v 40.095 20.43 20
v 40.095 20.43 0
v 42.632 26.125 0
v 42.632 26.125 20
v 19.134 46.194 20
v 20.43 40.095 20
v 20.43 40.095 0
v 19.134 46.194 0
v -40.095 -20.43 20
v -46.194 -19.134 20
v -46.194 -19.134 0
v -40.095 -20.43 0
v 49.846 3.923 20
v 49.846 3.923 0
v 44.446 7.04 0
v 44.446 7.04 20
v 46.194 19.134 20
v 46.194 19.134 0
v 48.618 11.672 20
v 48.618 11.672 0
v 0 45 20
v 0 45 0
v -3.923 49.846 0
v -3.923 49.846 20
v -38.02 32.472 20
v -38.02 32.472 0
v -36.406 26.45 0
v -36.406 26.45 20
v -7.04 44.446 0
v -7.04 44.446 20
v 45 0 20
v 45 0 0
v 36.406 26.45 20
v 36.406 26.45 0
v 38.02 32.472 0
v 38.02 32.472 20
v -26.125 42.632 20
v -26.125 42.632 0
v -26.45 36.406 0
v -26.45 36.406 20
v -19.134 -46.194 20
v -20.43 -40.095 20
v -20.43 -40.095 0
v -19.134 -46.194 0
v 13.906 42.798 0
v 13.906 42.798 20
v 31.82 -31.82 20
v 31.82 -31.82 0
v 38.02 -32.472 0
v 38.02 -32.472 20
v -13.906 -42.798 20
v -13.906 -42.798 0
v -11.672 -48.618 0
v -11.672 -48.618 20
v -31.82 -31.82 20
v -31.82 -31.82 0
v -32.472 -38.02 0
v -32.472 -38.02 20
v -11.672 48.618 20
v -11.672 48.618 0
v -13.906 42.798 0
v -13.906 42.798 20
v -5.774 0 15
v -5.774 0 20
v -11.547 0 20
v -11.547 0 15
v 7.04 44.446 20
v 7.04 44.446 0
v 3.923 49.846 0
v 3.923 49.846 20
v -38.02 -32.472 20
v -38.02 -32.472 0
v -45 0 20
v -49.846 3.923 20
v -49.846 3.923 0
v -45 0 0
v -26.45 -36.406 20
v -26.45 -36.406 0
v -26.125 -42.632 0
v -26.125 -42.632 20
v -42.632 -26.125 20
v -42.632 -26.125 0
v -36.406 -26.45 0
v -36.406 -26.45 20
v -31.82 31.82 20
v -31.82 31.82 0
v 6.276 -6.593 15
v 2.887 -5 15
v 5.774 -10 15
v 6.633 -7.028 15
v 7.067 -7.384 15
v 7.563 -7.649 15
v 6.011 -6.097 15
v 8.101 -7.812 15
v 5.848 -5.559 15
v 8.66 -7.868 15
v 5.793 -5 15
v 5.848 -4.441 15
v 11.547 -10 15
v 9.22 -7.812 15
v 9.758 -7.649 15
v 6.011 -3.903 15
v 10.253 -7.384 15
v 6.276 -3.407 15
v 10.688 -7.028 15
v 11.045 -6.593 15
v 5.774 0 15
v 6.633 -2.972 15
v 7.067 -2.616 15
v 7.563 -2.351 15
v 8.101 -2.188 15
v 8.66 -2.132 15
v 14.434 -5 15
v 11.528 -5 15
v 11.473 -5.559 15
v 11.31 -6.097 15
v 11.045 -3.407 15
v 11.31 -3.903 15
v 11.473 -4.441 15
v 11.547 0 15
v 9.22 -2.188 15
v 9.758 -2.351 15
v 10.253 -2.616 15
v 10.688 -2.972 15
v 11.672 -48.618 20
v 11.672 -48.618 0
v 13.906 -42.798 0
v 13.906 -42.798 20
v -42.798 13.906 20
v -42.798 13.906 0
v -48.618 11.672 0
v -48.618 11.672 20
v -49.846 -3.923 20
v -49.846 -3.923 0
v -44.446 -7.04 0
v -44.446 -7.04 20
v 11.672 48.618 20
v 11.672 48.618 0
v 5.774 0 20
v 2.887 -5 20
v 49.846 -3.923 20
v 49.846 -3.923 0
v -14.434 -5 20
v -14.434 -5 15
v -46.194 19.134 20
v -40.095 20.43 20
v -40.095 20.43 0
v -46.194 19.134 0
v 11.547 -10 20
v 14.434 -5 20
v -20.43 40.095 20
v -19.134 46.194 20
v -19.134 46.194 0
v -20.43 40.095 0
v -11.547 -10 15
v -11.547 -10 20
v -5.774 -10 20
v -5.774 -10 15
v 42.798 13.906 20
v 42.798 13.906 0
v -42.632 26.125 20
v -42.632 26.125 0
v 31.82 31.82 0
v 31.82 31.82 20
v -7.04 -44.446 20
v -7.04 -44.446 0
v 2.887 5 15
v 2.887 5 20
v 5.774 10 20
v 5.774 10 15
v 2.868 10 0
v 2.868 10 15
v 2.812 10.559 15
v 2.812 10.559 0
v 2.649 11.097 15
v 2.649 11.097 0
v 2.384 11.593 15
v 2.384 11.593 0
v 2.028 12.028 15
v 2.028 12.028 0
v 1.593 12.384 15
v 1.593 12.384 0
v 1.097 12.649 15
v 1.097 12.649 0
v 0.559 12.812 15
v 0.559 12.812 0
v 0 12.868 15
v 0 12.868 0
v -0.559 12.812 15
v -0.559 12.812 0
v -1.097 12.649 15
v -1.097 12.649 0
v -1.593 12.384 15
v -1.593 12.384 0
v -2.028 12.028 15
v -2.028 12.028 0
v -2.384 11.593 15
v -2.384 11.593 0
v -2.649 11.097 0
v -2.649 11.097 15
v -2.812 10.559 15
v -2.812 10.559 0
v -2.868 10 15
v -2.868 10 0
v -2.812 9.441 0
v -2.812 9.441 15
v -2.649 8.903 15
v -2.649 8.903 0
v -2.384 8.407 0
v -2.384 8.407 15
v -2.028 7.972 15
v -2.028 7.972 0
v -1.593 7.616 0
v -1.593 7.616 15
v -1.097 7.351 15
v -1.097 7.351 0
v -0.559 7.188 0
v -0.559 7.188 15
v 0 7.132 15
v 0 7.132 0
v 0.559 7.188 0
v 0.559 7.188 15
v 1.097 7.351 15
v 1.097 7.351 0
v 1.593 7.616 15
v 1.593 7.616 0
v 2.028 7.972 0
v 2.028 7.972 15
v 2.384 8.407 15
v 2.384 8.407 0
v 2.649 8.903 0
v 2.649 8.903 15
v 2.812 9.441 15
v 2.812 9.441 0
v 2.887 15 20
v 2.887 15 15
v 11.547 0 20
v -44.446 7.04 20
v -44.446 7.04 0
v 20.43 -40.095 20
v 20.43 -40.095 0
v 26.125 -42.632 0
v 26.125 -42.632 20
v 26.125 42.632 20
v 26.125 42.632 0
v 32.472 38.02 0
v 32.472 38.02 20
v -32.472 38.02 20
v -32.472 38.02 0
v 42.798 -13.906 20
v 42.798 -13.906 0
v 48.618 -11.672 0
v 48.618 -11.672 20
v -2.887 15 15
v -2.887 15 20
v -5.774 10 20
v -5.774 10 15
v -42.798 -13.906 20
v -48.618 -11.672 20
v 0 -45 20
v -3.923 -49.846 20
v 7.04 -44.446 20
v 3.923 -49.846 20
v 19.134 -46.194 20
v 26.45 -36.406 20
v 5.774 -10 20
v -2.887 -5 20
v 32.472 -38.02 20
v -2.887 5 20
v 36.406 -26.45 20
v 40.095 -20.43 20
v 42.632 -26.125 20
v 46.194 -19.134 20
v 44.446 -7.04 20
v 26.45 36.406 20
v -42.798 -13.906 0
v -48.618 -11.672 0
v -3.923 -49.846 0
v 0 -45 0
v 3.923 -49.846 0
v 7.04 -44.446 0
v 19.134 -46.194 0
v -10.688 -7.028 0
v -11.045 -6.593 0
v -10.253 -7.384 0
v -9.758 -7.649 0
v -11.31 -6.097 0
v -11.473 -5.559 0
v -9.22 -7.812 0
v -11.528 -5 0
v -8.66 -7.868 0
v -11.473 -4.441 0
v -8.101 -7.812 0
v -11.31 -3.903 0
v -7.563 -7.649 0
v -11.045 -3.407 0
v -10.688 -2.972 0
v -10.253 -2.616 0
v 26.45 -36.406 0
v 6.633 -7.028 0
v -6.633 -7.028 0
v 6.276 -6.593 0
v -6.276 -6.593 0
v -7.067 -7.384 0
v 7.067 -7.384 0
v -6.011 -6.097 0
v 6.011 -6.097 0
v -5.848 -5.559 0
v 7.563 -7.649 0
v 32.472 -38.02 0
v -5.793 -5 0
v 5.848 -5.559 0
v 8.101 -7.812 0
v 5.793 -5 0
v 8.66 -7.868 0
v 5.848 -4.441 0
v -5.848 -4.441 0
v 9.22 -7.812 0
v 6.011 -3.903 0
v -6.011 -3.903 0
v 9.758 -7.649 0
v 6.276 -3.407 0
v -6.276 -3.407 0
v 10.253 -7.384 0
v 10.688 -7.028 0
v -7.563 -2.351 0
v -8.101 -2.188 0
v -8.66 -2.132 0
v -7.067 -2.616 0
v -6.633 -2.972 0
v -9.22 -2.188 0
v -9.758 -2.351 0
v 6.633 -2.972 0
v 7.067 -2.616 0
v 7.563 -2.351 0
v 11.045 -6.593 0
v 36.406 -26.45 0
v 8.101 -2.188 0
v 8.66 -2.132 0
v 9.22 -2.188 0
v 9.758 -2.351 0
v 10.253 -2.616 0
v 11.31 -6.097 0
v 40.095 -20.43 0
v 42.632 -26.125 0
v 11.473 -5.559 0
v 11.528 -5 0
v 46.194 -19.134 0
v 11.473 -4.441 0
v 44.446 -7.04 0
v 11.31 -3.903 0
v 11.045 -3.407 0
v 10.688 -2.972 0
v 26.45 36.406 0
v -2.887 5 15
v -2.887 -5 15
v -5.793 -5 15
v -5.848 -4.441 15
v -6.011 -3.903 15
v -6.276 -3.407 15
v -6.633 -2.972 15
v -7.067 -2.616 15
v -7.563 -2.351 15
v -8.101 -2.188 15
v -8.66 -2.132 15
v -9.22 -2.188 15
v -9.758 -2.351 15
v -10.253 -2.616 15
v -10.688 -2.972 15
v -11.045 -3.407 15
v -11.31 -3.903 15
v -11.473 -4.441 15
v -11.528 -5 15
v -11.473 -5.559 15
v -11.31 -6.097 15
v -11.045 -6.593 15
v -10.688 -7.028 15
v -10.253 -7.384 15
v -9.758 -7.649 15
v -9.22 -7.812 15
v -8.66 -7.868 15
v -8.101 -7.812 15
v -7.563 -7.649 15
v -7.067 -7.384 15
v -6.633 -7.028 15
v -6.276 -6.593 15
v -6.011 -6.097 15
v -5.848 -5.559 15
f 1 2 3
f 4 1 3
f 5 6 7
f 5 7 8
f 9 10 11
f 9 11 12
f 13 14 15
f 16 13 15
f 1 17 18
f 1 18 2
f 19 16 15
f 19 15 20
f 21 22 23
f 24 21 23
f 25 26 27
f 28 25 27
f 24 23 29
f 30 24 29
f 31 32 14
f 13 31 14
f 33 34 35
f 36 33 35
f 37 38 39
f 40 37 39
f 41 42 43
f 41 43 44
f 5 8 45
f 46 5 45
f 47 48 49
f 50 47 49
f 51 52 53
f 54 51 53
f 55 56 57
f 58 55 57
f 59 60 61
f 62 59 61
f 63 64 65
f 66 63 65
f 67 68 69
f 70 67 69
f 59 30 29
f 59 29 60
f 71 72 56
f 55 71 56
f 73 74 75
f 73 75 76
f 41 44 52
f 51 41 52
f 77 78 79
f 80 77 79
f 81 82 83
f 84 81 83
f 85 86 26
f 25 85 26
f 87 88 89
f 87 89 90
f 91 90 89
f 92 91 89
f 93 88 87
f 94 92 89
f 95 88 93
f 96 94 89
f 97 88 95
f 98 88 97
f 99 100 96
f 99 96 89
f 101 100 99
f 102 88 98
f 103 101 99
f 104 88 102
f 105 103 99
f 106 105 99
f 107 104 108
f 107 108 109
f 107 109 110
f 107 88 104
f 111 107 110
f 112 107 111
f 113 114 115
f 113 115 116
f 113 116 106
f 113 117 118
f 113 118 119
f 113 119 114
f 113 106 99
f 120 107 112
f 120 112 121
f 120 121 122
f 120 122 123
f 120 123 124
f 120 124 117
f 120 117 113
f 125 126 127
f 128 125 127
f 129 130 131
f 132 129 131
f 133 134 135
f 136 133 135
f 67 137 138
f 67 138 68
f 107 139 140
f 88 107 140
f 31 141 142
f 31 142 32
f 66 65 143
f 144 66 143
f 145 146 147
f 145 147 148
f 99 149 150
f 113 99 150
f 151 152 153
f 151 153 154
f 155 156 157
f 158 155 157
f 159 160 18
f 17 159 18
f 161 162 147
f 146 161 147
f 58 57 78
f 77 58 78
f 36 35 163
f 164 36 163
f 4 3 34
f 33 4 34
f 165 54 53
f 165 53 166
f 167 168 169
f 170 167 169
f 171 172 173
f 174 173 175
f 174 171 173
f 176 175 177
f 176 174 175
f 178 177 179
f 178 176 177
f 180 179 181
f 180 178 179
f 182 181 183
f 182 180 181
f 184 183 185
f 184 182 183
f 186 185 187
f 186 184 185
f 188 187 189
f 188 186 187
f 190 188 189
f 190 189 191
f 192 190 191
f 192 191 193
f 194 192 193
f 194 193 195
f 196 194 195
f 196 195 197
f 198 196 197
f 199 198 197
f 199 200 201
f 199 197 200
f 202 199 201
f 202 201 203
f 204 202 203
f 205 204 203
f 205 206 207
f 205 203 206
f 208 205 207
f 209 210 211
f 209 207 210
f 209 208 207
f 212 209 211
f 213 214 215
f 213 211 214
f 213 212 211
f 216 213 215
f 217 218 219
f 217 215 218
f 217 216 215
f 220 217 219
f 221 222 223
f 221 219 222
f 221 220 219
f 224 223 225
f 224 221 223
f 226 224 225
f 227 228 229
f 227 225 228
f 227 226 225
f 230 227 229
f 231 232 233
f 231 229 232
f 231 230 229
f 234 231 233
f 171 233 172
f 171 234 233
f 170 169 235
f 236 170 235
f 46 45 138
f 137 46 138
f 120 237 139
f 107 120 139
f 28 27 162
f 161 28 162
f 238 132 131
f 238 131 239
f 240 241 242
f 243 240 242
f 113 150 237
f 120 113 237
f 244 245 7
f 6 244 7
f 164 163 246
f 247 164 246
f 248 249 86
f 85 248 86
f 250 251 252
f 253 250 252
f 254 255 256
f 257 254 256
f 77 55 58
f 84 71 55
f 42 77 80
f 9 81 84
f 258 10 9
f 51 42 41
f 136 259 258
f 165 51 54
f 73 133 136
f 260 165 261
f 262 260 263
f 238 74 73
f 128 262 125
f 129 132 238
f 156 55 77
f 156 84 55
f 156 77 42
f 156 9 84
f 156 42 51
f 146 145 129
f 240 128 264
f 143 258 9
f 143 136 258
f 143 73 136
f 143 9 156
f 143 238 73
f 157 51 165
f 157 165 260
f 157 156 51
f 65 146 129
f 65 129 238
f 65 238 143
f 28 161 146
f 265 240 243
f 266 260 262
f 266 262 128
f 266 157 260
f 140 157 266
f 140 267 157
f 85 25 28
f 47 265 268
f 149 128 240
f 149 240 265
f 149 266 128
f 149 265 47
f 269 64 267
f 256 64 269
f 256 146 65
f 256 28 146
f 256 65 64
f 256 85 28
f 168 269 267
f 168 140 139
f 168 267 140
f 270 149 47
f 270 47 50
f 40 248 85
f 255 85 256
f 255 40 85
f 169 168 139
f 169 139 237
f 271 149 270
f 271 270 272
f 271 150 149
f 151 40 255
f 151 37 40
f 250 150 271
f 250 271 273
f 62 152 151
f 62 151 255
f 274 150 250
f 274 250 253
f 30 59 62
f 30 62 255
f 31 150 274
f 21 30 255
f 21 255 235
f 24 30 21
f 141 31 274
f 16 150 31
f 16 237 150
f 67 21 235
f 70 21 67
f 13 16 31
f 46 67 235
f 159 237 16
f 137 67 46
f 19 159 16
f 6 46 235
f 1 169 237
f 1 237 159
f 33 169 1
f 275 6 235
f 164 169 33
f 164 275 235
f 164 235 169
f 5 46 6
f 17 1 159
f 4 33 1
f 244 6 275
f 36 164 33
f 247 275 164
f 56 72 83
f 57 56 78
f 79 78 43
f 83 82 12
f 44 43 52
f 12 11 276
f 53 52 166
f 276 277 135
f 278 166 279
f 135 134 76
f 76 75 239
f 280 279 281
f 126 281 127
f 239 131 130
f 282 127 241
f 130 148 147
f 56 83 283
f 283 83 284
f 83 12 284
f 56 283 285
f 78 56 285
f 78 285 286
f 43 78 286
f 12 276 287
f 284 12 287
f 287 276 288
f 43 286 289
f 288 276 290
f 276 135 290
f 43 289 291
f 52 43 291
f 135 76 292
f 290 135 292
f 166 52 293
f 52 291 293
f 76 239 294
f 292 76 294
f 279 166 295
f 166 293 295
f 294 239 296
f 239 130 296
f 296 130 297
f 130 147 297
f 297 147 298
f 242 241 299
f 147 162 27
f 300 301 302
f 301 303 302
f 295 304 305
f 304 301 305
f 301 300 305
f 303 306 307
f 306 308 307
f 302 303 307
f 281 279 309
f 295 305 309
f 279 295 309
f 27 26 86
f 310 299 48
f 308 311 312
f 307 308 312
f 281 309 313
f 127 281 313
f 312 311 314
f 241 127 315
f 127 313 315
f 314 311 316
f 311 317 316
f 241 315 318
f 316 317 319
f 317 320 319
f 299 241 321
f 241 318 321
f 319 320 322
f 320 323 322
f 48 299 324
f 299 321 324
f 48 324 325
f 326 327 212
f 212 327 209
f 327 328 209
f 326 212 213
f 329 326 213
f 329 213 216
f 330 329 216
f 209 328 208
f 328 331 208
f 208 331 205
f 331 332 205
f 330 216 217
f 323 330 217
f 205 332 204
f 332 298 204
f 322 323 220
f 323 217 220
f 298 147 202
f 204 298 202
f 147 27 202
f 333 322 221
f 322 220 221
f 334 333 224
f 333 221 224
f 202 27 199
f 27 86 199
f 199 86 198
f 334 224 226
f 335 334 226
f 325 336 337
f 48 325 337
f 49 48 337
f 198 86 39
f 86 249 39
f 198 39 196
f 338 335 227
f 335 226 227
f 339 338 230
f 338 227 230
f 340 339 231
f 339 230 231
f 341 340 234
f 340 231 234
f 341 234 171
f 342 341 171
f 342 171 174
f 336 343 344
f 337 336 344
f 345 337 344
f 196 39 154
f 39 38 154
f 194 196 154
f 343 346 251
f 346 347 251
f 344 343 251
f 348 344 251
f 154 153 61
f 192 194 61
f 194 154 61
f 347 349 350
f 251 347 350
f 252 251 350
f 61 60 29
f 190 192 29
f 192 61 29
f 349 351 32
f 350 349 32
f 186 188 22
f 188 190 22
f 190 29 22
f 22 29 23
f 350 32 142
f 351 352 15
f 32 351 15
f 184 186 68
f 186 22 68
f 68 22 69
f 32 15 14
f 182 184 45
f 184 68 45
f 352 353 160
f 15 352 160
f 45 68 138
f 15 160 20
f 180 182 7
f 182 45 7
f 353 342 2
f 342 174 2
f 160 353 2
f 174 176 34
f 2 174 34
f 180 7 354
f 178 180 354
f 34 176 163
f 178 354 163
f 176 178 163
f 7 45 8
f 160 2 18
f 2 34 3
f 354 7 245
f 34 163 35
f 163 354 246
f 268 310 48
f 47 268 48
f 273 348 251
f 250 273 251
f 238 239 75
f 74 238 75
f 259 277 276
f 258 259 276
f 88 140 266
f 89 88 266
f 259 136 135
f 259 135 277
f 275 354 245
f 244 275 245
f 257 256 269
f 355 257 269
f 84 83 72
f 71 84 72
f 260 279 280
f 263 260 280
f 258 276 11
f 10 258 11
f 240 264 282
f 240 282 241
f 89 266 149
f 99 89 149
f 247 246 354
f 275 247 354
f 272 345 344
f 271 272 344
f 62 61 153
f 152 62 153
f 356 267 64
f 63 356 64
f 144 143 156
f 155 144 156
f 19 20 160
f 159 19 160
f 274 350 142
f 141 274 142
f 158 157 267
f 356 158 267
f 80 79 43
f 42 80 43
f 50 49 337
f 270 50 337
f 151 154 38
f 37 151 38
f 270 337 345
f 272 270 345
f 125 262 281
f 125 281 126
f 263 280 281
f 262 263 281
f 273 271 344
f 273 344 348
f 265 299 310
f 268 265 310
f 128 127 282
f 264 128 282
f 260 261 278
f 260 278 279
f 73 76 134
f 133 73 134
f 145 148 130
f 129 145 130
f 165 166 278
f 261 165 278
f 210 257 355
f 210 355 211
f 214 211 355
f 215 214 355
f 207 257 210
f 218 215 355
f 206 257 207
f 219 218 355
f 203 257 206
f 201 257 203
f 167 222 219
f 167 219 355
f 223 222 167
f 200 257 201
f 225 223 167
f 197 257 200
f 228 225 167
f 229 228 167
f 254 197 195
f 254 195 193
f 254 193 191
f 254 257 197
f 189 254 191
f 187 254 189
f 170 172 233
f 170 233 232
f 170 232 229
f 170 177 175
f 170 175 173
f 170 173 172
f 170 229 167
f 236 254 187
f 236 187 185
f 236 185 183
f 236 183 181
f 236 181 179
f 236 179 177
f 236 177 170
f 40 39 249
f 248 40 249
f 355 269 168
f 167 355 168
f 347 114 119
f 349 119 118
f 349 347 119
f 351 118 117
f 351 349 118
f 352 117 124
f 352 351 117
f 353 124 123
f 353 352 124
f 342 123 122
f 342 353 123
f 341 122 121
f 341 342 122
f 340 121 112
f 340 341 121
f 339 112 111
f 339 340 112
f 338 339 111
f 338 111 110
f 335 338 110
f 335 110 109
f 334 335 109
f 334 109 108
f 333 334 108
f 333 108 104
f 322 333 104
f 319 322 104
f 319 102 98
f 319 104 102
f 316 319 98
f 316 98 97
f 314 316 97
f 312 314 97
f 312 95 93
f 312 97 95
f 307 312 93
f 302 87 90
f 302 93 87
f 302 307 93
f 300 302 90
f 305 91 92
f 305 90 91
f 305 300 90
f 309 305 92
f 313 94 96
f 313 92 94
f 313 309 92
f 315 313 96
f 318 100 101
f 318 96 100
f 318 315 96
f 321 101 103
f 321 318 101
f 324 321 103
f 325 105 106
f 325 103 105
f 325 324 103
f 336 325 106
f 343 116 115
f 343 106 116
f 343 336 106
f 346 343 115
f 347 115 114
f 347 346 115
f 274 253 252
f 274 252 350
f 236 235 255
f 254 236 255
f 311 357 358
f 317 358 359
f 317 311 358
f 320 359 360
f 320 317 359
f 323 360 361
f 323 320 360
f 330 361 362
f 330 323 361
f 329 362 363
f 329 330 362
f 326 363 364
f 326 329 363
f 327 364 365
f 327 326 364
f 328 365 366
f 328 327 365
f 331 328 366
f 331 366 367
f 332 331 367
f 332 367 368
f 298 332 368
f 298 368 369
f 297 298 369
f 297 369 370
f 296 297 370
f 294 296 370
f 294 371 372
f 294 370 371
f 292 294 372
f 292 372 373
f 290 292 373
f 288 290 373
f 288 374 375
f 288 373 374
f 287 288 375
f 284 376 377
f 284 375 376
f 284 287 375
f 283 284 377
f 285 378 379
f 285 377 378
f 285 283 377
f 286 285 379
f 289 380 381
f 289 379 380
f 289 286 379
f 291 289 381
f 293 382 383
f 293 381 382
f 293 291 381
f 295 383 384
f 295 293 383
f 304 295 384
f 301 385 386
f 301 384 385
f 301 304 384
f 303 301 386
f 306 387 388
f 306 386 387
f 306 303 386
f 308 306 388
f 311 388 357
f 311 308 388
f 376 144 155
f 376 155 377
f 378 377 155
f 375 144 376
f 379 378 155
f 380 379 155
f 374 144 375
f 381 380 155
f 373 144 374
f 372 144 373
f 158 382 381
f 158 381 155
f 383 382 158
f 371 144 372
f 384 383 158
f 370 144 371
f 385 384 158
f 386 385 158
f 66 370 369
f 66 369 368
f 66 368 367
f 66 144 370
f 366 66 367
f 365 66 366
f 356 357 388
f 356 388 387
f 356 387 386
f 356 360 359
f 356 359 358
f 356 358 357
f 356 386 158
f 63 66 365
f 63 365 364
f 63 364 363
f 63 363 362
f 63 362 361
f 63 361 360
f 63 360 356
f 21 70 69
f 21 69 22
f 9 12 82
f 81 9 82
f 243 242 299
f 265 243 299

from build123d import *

# Parameters (mm, degrees)
F0_R     = 2.867556
F1_DEPTH = 20
F3_DEPTH = 5


with BuildPart() as f1:
    # F0 (on Top) → F1 (new body)
    with BuildSketch(Plane.XY):
        Polygon((49.845867, -3.922955), (45, 0), (49.845867, 3.922955), (44.445975, 7.039551), (48.618496, 11.672268), (42.797543, 13.905765), (46.193977, 19.134172), (40.095294, 20.429572), (42.632008, 26.124928), (36.405765, 26.450336), (38.020298, 32.472402), (31.819805, 31.819805), (32.472402, 38.020298), (26.450336, 36.405765), (26.124928, 42.632008), (20.429572, 40.095294), (19.134172, 46.193977), (13.905765, 42.797543), (11.672268, 48.618496), (7.039551, 44.445975), (3.922955, 49.845867), (0, 45), (-3.922955, 49.845867), (-7.039551, 44.445975), (-11.672268, 48.618496), (-13.905765, 42.797543), (-19.134172, 46.193977), (-20.429572, 40.095294), (-26.124928, 42.632008), (-26.450336, 36.405765), (-32.472402, 38.020298), (-31.819805, 31.819805), (-38.020298, 32.472402), (-36.405765, 26.450336), (-42.632008, 26.124928), (-40.095294, 20.429572), (-46.193977, 19.134172), (-42.797543, 13.905765), (-48.618496, 11.672268), (-44.445975, 7.039551), (-49.845867, 3.922955), (-45, 0), (-49.845867, -3.922955), (-44.445975, -7.039551), (-48.618496, -11.672268), (-42.797543, -13.905765), (-46.193977, -19.134172), (-40.095294, -20.429572), (-42.632008, -26.124928), (-36.405765, -26.450336), (-38.020298, -32.472402), (-31.819805, -31.819805), (-32.472402, -38.020298), (-26.450336, -36.405765), (-26.124928, -42.632008), (-20.429572, -40.095294), (-19.134172, -46.193977), (-13.905765, -42.797543), (-11.672268, -48.618496), (-7.039551, -44.445975), (-3.922955, -49.845867), (0, -45), (3.922955, -49.845867), (7.039551, -44.445975), (11.672268, -48.618496), (13.905765, -42.797543), (19.134172, -46.193977), (20.429572, -40.095294), (26.124928, -42.632008), (26.450336, -36.405765), (32.472402, -38.020298), (31.819805, -31.819805), (38.020298, -32.472402), (36.405765, -26.450336), (42.632008, -26.124928), (40.095294, -20.429572), (46.193977, -19.134172), (42.797543, -13.905765), (48.618496, -11.672268), (44.445975, -7.039551), align=None)
        with Locations((-8.660254, -5)):
            Circle(F0_R, mode=Mode.SUBTRACT)
        with Locations((8.660254, -5)):
            Circle(F0_R, mode=Mode.SUBTRACT)
        with Locations((0, 10)):
            Circle(F0_R, mode=Mode.SUBTRACT)
    extrude(amount=F1_DEPTH)

    # F2 (on face) → F3 (cut)
    with BuildSketch(Plane.XY.offset(20)):
        Polygon((2.886751, 15), (-2.886751, 15), (-5.773503, 10), (-2.886751, 5), (2.886751, 5), (5.773503, 10), align=None)
        Polygon((-11.547005, 0), (-14.433757, -5), (-11.547005, -10), (-5.773503, -10), (-2.886751, -5), (-5.773503, 0), align=None)
        Polygon((5.773503, -10), (11.547005, -10), (14.433757, -5), (11.547005, 0), (5.773503, 0), (2.886751, -5), align=None)
    extrude(amount=-F3_DEPTH, mode=Mode.SUBTRACT)


solid = f1.part
